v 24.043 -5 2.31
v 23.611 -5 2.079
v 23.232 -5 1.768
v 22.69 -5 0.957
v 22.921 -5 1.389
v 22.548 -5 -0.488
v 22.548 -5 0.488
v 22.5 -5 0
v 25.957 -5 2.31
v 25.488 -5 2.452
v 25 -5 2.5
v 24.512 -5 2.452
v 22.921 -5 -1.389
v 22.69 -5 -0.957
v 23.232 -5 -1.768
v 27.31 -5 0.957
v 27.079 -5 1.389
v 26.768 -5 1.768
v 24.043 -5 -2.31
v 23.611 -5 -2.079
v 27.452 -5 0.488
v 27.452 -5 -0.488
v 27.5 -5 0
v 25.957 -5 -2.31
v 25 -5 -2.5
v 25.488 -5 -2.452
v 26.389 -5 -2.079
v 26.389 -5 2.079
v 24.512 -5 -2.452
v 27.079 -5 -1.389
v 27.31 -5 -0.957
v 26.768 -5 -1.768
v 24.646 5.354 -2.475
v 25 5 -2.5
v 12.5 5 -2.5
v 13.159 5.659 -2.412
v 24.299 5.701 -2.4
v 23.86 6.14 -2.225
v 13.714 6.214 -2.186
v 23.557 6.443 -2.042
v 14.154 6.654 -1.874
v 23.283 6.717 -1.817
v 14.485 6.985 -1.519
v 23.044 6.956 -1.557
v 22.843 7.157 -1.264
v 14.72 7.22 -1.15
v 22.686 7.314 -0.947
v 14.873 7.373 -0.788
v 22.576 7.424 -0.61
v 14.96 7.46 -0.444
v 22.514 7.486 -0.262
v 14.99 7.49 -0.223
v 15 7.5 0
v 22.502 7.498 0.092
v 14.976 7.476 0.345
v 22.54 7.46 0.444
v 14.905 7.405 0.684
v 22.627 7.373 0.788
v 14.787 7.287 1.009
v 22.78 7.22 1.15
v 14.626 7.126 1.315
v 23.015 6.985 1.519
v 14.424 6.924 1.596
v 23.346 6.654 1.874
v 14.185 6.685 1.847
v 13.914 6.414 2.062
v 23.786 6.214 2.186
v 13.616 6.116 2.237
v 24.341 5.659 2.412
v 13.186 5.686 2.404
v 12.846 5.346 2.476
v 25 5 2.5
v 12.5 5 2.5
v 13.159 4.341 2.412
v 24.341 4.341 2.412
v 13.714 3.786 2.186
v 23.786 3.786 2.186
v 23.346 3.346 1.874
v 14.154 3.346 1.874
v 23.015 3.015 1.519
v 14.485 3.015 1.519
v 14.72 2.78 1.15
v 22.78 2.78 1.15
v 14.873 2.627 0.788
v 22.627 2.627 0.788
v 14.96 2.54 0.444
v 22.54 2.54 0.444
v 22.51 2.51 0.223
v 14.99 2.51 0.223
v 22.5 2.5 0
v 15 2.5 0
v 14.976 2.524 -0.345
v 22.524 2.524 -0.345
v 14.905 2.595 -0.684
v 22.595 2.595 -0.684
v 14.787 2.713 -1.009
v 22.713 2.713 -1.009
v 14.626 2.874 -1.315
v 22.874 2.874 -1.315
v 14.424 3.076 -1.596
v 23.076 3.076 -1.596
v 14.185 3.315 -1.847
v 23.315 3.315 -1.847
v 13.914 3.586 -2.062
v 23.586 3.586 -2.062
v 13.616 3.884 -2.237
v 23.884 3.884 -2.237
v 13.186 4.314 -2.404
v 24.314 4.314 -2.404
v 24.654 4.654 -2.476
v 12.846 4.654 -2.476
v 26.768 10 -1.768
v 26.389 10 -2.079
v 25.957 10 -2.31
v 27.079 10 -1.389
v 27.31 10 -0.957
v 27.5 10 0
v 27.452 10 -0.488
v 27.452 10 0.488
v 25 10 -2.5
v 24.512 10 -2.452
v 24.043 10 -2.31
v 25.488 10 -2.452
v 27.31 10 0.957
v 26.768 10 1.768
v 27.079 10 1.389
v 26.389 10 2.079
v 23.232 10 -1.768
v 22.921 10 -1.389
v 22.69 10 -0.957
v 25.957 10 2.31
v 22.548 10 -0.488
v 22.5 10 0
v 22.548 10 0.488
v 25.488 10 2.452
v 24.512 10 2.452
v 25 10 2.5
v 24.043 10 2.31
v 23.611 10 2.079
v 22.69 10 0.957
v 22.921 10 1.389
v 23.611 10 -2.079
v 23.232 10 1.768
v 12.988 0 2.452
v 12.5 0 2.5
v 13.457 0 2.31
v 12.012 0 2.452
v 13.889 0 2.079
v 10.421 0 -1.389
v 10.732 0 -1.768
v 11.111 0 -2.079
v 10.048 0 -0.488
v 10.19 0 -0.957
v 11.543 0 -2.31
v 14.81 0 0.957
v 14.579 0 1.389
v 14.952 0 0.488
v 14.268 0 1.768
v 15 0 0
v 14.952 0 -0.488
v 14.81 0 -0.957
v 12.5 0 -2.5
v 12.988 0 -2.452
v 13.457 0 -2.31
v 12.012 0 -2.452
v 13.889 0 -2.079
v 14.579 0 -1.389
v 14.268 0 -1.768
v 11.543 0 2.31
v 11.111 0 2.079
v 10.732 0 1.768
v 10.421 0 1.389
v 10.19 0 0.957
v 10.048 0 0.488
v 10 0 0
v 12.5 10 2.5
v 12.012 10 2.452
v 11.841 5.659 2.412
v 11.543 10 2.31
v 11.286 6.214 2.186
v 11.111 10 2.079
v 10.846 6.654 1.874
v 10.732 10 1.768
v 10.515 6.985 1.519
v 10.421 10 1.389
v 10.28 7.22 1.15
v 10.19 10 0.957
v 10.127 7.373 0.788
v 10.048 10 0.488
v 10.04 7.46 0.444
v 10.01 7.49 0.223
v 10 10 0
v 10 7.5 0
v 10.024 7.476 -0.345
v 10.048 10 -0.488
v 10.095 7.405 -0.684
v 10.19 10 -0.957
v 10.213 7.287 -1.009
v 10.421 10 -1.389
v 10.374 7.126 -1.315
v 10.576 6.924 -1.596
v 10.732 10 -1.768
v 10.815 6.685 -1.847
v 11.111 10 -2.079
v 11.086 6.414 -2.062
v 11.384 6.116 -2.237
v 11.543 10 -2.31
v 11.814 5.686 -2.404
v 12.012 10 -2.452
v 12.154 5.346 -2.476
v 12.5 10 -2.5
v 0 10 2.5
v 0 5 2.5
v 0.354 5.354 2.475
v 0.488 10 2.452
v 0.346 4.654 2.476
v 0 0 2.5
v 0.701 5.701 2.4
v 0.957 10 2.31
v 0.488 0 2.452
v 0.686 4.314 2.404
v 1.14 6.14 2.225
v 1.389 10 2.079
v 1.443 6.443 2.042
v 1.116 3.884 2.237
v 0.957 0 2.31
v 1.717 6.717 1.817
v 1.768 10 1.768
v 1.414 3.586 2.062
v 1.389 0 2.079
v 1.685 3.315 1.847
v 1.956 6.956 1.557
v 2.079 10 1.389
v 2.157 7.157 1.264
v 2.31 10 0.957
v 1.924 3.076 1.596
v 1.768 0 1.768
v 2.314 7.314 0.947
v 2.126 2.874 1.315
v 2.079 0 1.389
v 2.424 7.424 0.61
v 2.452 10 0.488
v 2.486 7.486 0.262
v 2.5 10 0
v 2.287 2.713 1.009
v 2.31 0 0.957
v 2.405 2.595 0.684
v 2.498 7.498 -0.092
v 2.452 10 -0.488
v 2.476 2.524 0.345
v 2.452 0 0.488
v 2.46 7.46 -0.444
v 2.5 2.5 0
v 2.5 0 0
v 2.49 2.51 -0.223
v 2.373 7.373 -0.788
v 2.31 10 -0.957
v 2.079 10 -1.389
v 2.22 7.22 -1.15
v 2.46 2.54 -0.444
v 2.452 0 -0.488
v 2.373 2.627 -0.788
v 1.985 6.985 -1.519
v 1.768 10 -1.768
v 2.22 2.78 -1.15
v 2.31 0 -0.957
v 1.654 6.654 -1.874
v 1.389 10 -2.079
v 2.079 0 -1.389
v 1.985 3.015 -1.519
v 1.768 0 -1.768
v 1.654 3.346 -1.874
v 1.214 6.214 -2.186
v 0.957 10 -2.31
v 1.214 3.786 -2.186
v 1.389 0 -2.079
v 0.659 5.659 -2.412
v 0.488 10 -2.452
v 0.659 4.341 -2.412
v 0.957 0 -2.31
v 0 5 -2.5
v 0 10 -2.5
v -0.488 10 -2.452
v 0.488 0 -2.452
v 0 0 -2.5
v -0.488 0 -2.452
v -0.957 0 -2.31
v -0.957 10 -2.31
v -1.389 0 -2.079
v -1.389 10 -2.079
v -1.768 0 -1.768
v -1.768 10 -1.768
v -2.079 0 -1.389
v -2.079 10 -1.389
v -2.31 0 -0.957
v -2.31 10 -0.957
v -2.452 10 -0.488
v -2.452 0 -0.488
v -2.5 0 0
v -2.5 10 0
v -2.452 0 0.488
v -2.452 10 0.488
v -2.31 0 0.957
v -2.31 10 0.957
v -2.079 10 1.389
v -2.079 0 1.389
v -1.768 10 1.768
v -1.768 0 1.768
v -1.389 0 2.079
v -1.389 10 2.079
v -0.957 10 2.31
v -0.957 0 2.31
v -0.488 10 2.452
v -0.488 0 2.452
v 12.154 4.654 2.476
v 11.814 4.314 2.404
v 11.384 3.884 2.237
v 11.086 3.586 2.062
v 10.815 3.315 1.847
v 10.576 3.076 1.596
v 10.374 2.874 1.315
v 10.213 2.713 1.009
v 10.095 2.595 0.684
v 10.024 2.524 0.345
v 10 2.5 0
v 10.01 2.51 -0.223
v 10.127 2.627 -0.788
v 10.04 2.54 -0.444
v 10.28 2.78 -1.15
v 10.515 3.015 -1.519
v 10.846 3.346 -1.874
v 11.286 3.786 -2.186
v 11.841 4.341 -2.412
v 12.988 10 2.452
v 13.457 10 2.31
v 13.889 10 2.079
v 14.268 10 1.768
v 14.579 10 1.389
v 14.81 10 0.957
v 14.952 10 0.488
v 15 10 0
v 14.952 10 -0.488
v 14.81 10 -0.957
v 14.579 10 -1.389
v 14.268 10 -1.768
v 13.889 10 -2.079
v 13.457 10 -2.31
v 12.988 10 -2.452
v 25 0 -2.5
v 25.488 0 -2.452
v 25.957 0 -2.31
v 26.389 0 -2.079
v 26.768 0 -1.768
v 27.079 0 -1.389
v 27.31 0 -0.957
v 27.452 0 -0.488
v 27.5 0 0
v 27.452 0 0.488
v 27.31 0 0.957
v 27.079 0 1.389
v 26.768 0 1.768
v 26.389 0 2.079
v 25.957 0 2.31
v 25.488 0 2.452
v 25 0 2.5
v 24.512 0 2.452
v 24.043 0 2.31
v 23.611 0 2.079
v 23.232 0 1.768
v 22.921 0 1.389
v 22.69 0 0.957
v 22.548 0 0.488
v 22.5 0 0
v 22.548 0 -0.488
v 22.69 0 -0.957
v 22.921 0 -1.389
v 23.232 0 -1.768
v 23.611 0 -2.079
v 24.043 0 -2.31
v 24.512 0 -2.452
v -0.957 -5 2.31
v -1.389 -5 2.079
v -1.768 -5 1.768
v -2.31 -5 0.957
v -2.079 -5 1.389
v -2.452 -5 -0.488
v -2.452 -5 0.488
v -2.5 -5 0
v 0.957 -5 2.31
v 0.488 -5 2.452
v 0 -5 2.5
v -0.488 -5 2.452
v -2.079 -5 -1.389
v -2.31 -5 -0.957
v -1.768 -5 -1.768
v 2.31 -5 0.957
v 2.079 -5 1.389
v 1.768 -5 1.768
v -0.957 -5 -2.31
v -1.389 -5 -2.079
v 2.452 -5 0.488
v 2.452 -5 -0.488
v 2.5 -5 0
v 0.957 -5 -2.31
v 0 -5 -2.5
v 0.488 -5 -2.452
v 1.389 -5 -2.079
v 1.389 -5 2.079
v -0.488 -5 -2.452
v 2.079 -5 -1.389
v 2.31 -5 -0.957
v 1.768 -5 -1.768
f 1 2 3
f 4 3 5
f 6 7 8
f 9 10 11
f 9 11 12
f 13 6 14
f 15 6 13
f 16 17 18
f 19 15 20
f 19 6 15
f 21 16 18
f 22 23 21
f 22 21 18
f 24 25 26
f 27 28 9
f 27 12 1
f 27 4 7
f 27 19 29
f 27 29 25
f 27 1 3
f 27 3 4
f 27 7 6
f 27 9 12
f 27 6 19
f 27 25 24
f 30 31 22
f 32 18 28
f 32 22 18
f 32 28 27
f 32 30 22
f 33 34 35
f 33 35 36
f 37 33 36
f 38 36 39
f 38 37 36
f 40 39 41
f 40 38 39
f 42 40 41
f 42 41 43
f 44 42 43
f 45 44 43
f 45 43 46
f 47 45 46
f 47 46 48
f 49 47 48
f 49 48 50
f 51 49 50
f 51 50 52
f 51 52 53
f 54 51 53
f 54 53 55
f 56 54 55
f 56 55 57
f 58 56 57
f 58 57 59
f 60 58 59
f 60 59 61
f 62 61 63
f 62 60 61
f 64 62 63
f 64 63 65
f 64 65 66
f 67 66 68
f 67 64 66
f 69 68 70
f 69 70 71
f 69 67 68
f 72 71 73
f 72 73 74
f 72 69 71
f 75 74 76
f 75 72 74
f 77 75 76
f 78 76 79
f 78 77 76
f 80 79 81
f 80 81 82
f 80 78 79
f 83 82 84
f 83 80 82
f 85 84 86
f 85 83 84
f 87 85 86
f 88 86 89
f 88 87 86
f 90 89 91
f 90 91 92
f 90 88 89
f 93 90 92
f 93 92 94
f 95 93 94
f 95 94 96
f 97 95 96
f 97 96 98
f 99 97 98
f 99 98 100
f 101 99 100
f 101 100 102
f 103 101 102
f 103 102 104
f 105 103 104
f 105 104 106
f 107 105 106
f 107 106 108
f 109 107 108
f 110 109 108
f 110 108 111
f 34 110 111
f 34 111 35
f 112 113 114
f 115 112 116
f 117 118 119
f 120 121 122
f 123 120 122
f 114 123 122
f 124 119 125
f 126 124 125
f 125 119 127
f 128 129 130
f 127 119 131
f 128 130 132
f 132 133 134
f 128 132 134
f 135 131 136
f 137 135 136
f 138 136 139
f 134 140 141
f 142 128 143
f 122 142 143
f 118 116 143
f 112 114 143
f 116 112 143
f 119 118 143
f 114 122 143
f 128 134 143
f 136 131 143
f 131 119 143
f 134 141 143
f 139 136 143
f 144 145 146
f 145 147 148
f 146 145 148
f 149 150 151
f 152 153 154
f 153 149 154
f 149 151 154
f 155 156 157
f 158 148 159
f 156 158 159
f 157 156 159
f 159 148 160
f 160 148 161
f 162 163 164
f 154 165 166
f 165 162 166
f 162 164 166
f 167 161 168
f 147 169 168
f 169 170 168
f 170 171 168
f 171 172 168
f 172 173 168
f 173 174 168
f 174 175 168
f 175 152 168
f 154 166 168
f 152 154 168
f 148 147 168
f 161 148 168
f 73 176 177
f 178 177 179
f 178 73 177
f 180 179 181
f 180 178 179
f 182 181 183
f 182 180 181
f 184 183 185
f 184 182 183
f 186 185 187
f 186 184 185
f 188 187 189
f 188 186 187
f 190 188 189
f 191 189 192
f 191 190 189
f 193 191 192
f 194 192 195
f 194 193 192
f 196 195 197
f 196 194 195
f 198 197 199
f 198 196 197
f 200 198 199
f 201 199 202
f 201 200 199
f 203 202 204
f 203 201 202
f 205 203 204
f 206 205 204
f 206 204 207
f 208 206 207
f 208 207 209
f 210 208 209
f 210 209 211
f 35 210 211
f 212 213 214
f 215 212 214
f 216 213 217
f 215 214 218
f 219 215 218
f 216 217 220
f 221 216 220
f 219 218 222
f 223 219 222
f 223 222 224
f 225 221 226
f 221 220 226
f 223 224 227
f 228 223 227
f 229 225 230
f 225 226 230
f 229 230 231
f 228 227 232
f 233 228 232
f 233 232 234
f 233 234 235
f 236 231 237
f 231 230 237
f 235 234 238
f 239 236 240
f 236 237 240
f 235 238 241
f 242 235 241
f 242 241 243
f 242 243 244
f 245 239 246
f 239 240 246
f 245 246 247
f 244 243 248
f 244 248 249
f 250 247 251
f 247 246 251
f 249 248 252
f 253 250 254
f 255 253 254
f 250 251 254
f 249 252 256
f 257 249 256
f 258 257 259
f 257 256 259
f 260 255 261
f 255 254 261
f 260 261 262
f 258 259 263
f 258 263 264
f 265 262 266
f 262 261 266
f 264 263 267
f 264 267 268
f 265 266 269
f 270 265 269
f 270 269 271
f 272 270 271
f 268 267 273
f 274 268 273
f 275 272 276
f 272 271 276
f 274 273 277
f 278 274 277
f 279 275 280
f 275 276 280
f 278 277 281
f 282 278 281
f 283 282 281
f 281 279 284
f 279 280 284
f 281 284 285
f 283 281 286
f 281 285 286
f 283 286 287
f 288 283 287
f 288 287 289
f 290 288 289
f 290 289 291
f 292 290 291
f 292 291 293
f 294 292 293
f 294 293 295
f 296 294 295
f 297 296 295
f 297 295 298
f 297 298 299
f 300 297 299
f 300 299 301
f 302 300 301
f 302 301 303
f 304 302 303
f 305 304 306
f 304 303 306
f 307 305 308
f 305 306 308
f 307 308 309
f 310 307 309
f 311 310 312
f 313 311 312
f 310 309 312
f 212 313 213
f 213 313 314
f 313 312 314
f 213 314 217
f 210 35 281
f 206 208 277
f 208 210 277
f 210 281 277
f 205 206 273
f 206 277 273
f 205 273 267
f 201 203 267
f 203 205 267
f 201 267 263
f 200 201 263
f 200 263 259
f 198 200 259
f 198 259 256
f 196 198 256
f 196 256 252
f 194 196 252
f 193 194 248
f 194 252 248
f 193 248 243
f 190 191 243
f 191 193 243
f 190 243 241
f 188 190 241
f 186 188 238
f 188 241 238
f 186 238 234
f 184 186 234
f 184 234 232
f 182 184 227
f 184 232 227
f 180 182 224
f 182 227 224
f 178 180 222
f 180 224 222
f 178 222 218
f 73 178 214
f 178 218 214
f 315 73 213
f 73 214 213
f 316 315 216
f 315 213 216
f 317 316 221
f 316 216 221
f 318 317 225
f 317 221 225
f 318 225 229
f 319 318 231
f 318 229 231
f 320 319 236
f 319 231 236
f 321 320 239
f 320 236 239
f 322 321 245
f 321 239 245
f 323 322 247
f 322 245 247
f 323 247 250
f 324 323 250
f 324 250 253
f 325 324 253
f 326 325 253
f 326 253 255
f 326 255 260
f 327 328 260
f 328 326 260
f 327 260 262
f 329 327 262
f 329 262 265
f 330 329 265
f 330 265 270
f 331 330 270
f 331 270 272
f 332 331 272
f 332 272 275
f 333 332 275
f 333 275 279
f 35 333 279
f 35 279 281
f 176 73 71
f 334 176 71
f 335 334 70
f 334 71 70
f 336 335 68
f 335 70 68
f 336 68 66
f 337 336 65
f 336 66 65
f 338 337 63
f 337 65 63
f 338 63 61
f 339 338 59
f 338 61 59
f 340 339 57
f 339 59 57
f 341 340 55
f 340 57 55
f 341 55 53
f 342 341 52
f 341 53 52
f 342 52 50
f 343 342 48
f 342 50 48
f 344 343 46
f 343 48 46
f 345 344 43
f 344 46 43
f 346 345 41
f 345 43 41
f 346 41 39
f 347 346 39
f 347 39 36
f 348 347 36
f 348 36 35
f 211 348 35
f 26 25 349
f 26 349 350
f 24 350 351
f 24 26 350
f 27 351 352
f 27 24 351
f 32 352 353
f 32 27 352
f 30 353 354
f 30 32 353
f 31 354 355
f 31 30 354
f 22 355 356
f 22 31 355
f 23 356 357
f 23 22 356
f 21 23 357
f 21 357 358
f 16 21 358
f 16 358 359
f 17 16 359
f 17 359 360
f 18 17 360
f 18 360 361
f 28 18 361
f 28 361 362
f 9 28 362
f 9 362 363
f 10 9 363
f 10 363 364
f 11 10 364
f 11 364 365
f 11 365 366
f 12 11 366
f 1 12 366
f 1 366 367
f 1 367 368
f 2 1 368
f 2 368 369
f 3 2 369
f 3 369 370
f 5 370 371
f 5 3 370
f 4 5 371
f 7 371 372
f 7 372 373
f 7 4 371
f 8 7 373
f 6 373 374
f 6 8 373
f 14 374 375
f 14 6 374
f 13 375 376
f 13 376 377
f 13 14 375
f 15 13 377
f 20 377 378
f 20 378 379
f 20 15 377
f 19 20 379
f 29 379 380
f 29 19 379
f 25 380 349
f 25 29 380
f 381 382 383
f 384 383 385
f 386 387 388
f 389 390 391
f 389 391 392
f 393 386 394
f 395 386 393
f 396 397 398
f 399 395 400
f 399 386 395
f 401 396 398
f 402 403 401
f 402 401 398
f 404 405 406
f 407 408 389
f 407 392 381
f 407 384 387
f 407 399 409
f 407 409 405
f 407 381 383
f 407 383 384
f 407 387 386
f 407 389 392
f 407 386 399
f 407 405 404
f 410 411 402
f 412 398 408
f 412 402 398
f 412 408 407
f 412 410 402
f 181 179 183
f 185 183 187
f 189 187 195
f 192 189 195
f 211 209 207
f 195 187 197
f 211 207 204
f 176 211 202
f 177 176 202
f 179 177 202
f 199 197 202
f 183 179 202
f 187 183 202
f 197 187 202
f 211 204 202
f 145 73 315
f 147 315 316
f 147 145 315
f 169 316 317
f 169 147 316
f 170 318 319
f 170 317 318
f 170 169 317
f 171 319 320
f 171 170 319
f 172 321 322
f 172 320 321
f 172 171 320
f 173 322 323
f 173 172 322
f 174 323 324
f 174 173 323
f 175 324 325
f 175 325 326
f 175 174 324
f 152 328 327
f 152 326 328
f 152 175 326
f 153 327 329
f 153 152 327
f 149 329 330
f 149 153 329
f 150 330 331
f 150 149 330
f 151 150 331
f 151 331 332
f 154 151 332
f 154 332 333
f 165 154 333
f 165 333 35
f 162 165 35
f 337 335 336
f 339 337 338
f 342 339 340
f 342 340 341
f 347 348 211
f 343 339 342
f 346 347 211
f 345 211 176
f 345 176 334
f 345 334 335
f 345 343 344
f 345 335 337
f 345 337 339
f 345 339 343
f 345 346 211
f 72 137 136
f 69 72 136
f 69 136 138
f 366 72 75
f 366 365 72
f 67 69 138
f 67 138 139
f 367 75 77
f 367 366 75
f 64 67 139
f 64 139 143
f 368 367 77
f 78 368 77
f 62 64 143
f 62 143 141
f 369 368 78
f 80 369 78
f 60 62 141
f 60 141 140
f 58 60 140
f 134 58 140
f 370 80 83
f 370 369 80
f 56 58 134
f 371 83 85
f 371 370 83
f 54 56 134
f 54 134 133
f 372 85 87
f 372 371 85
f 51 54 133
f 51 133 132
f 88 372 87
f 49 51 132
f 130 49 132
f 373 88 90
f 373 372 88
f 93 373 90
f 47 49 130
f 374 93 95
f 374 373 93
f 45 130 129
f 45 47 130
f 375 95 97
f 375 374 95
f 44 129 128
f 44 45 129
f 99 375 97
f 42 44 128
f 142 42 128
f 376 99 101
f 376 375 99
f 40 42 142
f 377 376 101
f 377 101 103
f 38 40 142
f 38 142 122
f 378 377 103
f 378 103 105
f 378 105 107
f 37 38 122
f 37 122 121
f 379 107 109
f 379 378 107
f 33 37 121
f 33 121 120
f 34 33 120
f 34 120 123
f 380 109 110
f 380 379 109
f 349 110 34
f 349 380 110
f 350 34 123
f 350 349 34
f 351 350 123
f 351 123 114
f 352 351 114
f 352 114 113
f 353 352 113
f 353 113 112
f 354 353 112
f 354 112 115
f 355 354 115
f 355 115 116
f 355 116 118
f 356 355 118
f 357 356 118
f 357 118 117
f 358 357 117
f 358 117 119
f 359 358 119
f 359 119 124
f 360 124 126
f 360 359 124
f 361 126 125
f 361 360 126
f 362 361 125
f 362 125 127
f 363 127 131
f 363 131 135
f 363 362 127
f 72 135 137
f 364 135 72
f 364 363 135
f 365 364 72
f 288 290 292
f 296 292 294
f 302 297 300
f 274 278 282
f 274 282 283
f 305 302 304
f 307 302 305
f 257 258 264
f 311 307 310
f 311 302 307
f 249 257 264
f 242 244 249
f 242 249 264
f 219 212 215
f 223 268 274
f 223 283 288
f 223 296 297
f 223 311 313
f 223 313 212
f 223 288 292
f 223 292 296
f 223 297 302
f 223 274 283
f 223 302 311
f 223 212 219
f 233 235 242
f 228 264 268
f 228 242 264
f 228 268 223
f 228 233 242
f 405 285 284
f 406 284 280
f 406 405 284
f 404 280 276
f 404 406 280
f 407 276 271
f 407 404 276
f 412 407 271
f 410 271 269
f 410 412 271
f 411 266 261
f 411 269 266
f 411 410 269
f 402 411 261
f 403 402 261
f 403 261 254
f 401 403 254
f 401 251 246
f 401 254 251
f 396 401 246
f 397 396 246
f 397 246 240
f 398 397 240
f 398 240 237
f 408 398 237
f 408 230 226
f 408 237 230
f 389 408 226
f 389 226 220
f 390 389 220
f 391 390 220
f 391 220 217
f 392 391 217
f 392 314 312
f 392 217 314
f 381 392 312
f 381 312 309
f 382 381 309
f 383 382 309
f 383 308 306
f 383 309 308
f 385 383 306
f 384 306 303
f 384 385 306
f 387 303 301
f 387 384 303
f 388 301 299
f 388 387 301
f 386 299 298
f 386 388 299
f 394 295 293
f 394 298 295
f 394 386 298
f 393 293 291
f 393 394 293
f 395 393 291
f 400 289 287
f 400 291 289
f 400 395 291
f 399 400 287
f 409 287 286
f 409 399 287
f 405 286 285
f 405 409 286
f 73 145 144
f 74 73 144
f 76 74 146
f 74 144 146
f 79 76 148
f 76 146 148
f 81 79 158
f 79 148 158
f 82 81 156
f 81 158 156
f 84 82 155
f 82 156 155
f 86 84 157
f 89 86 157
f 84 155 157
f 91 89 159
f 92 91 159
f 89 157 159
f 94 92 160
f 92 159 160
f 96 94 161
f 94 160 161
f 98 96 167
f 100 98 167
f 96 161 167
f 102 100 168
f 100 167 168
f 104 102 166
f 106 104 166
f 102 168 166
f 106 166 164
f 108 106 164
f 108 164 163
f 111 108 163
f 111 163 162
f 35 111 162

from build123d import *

# Parameters (mm, degrees)
SKETCH2_R           = 2.5
BOSS_EXTRUDE2_DEPTH = 10
SKETCH3_R           = 2.5
BOSS_EXTRUDE3_DEPTH = 12.5
BOSS_EXTRUDE4_DEPTH = 10
BOSS_EXTRUDE5_START = 5
SKETCH5_R           = 2.5
BOSS_EXTRUDE5_DEPTH = 5


with BuildPart() as part:
    # Sketch2 → Boss-Extrude2 (new body)
    with BuildSketch(Plane(origin=(0, 0, 0), x_dir=(1, 0, 0), z_dir=(0, 1, 0))):
        with Locations(Location((0, 0, 0), (0, 0, 270))):
            Circle(SKETCH2_R)
    boss_extrude2 = extrude(amount=BOSS_EXTRUDE2_DEPTH)

    # Sketch3 → Boss-Extrude3 (add)
    with BuildSketch(Plane(origin=(0, 0, 0), x_dir=(0, 0, -1), z_dir=(1, 0, 0))):
        with Locations((0, 5)):
            Circle(SKETCH3_R)
    boss_extrude3 = extrude(amount=BOSS_EXTRUDE3_DEPTH)

    # Sketch4 → Boss-Extrude4 (add)
    with BuildSketch(Plane(origin=(0, 0, 0), x_dir=(1, 0, 0), z_dir=(0, 1, 0))):
        with BuildLine():
            Line((12.5, 2.5), (12.5, -2.5))
            ThreePointArc((12.5, -2.5), (10, 0), (12.5, 2.5))
        make_face()
    boss_extrude4 = extrude(amount=BOSS_EXTRUDE4_DEPTH)

    # Mirror5: Boss-Extrude2, Boss-Extrude3, Boss-Extrude4 across plane
    add(boss_extrude2.mirror(Plane(origin=(12.5, 5, 0), x_dir=(0, 0, 1), z_dir=(1, 0, 0))))
    add(boss_extrude3.mirror(Plane(origin=(12.5, 5, 0), x_dir=(0, 0, 1), z_dir=(1, 0, 0))))
    add(boss_extrude4.mirror(Plane(origin=(12.5, 5, 0), x_dir=(0, 0, 1), z_dir=(1, 0, 0))))

    # Sketch5 → Boss-Extrude5 (add)
    with BuildSketch(Plane.XZ.offset(BOSS_EXTRUDE5_START)):
        with Locations(Location((0, 0, 0), (0, 0, 270))):
            Circle(SKETCH5_R)
        with Locations(Location((25, 0, 0), (0, 0, 270))):
            Circle(SKETCH5_R)
    extrude(amount=-BOSS_EXTRUDE5_DEPTH)


solid = part.part
